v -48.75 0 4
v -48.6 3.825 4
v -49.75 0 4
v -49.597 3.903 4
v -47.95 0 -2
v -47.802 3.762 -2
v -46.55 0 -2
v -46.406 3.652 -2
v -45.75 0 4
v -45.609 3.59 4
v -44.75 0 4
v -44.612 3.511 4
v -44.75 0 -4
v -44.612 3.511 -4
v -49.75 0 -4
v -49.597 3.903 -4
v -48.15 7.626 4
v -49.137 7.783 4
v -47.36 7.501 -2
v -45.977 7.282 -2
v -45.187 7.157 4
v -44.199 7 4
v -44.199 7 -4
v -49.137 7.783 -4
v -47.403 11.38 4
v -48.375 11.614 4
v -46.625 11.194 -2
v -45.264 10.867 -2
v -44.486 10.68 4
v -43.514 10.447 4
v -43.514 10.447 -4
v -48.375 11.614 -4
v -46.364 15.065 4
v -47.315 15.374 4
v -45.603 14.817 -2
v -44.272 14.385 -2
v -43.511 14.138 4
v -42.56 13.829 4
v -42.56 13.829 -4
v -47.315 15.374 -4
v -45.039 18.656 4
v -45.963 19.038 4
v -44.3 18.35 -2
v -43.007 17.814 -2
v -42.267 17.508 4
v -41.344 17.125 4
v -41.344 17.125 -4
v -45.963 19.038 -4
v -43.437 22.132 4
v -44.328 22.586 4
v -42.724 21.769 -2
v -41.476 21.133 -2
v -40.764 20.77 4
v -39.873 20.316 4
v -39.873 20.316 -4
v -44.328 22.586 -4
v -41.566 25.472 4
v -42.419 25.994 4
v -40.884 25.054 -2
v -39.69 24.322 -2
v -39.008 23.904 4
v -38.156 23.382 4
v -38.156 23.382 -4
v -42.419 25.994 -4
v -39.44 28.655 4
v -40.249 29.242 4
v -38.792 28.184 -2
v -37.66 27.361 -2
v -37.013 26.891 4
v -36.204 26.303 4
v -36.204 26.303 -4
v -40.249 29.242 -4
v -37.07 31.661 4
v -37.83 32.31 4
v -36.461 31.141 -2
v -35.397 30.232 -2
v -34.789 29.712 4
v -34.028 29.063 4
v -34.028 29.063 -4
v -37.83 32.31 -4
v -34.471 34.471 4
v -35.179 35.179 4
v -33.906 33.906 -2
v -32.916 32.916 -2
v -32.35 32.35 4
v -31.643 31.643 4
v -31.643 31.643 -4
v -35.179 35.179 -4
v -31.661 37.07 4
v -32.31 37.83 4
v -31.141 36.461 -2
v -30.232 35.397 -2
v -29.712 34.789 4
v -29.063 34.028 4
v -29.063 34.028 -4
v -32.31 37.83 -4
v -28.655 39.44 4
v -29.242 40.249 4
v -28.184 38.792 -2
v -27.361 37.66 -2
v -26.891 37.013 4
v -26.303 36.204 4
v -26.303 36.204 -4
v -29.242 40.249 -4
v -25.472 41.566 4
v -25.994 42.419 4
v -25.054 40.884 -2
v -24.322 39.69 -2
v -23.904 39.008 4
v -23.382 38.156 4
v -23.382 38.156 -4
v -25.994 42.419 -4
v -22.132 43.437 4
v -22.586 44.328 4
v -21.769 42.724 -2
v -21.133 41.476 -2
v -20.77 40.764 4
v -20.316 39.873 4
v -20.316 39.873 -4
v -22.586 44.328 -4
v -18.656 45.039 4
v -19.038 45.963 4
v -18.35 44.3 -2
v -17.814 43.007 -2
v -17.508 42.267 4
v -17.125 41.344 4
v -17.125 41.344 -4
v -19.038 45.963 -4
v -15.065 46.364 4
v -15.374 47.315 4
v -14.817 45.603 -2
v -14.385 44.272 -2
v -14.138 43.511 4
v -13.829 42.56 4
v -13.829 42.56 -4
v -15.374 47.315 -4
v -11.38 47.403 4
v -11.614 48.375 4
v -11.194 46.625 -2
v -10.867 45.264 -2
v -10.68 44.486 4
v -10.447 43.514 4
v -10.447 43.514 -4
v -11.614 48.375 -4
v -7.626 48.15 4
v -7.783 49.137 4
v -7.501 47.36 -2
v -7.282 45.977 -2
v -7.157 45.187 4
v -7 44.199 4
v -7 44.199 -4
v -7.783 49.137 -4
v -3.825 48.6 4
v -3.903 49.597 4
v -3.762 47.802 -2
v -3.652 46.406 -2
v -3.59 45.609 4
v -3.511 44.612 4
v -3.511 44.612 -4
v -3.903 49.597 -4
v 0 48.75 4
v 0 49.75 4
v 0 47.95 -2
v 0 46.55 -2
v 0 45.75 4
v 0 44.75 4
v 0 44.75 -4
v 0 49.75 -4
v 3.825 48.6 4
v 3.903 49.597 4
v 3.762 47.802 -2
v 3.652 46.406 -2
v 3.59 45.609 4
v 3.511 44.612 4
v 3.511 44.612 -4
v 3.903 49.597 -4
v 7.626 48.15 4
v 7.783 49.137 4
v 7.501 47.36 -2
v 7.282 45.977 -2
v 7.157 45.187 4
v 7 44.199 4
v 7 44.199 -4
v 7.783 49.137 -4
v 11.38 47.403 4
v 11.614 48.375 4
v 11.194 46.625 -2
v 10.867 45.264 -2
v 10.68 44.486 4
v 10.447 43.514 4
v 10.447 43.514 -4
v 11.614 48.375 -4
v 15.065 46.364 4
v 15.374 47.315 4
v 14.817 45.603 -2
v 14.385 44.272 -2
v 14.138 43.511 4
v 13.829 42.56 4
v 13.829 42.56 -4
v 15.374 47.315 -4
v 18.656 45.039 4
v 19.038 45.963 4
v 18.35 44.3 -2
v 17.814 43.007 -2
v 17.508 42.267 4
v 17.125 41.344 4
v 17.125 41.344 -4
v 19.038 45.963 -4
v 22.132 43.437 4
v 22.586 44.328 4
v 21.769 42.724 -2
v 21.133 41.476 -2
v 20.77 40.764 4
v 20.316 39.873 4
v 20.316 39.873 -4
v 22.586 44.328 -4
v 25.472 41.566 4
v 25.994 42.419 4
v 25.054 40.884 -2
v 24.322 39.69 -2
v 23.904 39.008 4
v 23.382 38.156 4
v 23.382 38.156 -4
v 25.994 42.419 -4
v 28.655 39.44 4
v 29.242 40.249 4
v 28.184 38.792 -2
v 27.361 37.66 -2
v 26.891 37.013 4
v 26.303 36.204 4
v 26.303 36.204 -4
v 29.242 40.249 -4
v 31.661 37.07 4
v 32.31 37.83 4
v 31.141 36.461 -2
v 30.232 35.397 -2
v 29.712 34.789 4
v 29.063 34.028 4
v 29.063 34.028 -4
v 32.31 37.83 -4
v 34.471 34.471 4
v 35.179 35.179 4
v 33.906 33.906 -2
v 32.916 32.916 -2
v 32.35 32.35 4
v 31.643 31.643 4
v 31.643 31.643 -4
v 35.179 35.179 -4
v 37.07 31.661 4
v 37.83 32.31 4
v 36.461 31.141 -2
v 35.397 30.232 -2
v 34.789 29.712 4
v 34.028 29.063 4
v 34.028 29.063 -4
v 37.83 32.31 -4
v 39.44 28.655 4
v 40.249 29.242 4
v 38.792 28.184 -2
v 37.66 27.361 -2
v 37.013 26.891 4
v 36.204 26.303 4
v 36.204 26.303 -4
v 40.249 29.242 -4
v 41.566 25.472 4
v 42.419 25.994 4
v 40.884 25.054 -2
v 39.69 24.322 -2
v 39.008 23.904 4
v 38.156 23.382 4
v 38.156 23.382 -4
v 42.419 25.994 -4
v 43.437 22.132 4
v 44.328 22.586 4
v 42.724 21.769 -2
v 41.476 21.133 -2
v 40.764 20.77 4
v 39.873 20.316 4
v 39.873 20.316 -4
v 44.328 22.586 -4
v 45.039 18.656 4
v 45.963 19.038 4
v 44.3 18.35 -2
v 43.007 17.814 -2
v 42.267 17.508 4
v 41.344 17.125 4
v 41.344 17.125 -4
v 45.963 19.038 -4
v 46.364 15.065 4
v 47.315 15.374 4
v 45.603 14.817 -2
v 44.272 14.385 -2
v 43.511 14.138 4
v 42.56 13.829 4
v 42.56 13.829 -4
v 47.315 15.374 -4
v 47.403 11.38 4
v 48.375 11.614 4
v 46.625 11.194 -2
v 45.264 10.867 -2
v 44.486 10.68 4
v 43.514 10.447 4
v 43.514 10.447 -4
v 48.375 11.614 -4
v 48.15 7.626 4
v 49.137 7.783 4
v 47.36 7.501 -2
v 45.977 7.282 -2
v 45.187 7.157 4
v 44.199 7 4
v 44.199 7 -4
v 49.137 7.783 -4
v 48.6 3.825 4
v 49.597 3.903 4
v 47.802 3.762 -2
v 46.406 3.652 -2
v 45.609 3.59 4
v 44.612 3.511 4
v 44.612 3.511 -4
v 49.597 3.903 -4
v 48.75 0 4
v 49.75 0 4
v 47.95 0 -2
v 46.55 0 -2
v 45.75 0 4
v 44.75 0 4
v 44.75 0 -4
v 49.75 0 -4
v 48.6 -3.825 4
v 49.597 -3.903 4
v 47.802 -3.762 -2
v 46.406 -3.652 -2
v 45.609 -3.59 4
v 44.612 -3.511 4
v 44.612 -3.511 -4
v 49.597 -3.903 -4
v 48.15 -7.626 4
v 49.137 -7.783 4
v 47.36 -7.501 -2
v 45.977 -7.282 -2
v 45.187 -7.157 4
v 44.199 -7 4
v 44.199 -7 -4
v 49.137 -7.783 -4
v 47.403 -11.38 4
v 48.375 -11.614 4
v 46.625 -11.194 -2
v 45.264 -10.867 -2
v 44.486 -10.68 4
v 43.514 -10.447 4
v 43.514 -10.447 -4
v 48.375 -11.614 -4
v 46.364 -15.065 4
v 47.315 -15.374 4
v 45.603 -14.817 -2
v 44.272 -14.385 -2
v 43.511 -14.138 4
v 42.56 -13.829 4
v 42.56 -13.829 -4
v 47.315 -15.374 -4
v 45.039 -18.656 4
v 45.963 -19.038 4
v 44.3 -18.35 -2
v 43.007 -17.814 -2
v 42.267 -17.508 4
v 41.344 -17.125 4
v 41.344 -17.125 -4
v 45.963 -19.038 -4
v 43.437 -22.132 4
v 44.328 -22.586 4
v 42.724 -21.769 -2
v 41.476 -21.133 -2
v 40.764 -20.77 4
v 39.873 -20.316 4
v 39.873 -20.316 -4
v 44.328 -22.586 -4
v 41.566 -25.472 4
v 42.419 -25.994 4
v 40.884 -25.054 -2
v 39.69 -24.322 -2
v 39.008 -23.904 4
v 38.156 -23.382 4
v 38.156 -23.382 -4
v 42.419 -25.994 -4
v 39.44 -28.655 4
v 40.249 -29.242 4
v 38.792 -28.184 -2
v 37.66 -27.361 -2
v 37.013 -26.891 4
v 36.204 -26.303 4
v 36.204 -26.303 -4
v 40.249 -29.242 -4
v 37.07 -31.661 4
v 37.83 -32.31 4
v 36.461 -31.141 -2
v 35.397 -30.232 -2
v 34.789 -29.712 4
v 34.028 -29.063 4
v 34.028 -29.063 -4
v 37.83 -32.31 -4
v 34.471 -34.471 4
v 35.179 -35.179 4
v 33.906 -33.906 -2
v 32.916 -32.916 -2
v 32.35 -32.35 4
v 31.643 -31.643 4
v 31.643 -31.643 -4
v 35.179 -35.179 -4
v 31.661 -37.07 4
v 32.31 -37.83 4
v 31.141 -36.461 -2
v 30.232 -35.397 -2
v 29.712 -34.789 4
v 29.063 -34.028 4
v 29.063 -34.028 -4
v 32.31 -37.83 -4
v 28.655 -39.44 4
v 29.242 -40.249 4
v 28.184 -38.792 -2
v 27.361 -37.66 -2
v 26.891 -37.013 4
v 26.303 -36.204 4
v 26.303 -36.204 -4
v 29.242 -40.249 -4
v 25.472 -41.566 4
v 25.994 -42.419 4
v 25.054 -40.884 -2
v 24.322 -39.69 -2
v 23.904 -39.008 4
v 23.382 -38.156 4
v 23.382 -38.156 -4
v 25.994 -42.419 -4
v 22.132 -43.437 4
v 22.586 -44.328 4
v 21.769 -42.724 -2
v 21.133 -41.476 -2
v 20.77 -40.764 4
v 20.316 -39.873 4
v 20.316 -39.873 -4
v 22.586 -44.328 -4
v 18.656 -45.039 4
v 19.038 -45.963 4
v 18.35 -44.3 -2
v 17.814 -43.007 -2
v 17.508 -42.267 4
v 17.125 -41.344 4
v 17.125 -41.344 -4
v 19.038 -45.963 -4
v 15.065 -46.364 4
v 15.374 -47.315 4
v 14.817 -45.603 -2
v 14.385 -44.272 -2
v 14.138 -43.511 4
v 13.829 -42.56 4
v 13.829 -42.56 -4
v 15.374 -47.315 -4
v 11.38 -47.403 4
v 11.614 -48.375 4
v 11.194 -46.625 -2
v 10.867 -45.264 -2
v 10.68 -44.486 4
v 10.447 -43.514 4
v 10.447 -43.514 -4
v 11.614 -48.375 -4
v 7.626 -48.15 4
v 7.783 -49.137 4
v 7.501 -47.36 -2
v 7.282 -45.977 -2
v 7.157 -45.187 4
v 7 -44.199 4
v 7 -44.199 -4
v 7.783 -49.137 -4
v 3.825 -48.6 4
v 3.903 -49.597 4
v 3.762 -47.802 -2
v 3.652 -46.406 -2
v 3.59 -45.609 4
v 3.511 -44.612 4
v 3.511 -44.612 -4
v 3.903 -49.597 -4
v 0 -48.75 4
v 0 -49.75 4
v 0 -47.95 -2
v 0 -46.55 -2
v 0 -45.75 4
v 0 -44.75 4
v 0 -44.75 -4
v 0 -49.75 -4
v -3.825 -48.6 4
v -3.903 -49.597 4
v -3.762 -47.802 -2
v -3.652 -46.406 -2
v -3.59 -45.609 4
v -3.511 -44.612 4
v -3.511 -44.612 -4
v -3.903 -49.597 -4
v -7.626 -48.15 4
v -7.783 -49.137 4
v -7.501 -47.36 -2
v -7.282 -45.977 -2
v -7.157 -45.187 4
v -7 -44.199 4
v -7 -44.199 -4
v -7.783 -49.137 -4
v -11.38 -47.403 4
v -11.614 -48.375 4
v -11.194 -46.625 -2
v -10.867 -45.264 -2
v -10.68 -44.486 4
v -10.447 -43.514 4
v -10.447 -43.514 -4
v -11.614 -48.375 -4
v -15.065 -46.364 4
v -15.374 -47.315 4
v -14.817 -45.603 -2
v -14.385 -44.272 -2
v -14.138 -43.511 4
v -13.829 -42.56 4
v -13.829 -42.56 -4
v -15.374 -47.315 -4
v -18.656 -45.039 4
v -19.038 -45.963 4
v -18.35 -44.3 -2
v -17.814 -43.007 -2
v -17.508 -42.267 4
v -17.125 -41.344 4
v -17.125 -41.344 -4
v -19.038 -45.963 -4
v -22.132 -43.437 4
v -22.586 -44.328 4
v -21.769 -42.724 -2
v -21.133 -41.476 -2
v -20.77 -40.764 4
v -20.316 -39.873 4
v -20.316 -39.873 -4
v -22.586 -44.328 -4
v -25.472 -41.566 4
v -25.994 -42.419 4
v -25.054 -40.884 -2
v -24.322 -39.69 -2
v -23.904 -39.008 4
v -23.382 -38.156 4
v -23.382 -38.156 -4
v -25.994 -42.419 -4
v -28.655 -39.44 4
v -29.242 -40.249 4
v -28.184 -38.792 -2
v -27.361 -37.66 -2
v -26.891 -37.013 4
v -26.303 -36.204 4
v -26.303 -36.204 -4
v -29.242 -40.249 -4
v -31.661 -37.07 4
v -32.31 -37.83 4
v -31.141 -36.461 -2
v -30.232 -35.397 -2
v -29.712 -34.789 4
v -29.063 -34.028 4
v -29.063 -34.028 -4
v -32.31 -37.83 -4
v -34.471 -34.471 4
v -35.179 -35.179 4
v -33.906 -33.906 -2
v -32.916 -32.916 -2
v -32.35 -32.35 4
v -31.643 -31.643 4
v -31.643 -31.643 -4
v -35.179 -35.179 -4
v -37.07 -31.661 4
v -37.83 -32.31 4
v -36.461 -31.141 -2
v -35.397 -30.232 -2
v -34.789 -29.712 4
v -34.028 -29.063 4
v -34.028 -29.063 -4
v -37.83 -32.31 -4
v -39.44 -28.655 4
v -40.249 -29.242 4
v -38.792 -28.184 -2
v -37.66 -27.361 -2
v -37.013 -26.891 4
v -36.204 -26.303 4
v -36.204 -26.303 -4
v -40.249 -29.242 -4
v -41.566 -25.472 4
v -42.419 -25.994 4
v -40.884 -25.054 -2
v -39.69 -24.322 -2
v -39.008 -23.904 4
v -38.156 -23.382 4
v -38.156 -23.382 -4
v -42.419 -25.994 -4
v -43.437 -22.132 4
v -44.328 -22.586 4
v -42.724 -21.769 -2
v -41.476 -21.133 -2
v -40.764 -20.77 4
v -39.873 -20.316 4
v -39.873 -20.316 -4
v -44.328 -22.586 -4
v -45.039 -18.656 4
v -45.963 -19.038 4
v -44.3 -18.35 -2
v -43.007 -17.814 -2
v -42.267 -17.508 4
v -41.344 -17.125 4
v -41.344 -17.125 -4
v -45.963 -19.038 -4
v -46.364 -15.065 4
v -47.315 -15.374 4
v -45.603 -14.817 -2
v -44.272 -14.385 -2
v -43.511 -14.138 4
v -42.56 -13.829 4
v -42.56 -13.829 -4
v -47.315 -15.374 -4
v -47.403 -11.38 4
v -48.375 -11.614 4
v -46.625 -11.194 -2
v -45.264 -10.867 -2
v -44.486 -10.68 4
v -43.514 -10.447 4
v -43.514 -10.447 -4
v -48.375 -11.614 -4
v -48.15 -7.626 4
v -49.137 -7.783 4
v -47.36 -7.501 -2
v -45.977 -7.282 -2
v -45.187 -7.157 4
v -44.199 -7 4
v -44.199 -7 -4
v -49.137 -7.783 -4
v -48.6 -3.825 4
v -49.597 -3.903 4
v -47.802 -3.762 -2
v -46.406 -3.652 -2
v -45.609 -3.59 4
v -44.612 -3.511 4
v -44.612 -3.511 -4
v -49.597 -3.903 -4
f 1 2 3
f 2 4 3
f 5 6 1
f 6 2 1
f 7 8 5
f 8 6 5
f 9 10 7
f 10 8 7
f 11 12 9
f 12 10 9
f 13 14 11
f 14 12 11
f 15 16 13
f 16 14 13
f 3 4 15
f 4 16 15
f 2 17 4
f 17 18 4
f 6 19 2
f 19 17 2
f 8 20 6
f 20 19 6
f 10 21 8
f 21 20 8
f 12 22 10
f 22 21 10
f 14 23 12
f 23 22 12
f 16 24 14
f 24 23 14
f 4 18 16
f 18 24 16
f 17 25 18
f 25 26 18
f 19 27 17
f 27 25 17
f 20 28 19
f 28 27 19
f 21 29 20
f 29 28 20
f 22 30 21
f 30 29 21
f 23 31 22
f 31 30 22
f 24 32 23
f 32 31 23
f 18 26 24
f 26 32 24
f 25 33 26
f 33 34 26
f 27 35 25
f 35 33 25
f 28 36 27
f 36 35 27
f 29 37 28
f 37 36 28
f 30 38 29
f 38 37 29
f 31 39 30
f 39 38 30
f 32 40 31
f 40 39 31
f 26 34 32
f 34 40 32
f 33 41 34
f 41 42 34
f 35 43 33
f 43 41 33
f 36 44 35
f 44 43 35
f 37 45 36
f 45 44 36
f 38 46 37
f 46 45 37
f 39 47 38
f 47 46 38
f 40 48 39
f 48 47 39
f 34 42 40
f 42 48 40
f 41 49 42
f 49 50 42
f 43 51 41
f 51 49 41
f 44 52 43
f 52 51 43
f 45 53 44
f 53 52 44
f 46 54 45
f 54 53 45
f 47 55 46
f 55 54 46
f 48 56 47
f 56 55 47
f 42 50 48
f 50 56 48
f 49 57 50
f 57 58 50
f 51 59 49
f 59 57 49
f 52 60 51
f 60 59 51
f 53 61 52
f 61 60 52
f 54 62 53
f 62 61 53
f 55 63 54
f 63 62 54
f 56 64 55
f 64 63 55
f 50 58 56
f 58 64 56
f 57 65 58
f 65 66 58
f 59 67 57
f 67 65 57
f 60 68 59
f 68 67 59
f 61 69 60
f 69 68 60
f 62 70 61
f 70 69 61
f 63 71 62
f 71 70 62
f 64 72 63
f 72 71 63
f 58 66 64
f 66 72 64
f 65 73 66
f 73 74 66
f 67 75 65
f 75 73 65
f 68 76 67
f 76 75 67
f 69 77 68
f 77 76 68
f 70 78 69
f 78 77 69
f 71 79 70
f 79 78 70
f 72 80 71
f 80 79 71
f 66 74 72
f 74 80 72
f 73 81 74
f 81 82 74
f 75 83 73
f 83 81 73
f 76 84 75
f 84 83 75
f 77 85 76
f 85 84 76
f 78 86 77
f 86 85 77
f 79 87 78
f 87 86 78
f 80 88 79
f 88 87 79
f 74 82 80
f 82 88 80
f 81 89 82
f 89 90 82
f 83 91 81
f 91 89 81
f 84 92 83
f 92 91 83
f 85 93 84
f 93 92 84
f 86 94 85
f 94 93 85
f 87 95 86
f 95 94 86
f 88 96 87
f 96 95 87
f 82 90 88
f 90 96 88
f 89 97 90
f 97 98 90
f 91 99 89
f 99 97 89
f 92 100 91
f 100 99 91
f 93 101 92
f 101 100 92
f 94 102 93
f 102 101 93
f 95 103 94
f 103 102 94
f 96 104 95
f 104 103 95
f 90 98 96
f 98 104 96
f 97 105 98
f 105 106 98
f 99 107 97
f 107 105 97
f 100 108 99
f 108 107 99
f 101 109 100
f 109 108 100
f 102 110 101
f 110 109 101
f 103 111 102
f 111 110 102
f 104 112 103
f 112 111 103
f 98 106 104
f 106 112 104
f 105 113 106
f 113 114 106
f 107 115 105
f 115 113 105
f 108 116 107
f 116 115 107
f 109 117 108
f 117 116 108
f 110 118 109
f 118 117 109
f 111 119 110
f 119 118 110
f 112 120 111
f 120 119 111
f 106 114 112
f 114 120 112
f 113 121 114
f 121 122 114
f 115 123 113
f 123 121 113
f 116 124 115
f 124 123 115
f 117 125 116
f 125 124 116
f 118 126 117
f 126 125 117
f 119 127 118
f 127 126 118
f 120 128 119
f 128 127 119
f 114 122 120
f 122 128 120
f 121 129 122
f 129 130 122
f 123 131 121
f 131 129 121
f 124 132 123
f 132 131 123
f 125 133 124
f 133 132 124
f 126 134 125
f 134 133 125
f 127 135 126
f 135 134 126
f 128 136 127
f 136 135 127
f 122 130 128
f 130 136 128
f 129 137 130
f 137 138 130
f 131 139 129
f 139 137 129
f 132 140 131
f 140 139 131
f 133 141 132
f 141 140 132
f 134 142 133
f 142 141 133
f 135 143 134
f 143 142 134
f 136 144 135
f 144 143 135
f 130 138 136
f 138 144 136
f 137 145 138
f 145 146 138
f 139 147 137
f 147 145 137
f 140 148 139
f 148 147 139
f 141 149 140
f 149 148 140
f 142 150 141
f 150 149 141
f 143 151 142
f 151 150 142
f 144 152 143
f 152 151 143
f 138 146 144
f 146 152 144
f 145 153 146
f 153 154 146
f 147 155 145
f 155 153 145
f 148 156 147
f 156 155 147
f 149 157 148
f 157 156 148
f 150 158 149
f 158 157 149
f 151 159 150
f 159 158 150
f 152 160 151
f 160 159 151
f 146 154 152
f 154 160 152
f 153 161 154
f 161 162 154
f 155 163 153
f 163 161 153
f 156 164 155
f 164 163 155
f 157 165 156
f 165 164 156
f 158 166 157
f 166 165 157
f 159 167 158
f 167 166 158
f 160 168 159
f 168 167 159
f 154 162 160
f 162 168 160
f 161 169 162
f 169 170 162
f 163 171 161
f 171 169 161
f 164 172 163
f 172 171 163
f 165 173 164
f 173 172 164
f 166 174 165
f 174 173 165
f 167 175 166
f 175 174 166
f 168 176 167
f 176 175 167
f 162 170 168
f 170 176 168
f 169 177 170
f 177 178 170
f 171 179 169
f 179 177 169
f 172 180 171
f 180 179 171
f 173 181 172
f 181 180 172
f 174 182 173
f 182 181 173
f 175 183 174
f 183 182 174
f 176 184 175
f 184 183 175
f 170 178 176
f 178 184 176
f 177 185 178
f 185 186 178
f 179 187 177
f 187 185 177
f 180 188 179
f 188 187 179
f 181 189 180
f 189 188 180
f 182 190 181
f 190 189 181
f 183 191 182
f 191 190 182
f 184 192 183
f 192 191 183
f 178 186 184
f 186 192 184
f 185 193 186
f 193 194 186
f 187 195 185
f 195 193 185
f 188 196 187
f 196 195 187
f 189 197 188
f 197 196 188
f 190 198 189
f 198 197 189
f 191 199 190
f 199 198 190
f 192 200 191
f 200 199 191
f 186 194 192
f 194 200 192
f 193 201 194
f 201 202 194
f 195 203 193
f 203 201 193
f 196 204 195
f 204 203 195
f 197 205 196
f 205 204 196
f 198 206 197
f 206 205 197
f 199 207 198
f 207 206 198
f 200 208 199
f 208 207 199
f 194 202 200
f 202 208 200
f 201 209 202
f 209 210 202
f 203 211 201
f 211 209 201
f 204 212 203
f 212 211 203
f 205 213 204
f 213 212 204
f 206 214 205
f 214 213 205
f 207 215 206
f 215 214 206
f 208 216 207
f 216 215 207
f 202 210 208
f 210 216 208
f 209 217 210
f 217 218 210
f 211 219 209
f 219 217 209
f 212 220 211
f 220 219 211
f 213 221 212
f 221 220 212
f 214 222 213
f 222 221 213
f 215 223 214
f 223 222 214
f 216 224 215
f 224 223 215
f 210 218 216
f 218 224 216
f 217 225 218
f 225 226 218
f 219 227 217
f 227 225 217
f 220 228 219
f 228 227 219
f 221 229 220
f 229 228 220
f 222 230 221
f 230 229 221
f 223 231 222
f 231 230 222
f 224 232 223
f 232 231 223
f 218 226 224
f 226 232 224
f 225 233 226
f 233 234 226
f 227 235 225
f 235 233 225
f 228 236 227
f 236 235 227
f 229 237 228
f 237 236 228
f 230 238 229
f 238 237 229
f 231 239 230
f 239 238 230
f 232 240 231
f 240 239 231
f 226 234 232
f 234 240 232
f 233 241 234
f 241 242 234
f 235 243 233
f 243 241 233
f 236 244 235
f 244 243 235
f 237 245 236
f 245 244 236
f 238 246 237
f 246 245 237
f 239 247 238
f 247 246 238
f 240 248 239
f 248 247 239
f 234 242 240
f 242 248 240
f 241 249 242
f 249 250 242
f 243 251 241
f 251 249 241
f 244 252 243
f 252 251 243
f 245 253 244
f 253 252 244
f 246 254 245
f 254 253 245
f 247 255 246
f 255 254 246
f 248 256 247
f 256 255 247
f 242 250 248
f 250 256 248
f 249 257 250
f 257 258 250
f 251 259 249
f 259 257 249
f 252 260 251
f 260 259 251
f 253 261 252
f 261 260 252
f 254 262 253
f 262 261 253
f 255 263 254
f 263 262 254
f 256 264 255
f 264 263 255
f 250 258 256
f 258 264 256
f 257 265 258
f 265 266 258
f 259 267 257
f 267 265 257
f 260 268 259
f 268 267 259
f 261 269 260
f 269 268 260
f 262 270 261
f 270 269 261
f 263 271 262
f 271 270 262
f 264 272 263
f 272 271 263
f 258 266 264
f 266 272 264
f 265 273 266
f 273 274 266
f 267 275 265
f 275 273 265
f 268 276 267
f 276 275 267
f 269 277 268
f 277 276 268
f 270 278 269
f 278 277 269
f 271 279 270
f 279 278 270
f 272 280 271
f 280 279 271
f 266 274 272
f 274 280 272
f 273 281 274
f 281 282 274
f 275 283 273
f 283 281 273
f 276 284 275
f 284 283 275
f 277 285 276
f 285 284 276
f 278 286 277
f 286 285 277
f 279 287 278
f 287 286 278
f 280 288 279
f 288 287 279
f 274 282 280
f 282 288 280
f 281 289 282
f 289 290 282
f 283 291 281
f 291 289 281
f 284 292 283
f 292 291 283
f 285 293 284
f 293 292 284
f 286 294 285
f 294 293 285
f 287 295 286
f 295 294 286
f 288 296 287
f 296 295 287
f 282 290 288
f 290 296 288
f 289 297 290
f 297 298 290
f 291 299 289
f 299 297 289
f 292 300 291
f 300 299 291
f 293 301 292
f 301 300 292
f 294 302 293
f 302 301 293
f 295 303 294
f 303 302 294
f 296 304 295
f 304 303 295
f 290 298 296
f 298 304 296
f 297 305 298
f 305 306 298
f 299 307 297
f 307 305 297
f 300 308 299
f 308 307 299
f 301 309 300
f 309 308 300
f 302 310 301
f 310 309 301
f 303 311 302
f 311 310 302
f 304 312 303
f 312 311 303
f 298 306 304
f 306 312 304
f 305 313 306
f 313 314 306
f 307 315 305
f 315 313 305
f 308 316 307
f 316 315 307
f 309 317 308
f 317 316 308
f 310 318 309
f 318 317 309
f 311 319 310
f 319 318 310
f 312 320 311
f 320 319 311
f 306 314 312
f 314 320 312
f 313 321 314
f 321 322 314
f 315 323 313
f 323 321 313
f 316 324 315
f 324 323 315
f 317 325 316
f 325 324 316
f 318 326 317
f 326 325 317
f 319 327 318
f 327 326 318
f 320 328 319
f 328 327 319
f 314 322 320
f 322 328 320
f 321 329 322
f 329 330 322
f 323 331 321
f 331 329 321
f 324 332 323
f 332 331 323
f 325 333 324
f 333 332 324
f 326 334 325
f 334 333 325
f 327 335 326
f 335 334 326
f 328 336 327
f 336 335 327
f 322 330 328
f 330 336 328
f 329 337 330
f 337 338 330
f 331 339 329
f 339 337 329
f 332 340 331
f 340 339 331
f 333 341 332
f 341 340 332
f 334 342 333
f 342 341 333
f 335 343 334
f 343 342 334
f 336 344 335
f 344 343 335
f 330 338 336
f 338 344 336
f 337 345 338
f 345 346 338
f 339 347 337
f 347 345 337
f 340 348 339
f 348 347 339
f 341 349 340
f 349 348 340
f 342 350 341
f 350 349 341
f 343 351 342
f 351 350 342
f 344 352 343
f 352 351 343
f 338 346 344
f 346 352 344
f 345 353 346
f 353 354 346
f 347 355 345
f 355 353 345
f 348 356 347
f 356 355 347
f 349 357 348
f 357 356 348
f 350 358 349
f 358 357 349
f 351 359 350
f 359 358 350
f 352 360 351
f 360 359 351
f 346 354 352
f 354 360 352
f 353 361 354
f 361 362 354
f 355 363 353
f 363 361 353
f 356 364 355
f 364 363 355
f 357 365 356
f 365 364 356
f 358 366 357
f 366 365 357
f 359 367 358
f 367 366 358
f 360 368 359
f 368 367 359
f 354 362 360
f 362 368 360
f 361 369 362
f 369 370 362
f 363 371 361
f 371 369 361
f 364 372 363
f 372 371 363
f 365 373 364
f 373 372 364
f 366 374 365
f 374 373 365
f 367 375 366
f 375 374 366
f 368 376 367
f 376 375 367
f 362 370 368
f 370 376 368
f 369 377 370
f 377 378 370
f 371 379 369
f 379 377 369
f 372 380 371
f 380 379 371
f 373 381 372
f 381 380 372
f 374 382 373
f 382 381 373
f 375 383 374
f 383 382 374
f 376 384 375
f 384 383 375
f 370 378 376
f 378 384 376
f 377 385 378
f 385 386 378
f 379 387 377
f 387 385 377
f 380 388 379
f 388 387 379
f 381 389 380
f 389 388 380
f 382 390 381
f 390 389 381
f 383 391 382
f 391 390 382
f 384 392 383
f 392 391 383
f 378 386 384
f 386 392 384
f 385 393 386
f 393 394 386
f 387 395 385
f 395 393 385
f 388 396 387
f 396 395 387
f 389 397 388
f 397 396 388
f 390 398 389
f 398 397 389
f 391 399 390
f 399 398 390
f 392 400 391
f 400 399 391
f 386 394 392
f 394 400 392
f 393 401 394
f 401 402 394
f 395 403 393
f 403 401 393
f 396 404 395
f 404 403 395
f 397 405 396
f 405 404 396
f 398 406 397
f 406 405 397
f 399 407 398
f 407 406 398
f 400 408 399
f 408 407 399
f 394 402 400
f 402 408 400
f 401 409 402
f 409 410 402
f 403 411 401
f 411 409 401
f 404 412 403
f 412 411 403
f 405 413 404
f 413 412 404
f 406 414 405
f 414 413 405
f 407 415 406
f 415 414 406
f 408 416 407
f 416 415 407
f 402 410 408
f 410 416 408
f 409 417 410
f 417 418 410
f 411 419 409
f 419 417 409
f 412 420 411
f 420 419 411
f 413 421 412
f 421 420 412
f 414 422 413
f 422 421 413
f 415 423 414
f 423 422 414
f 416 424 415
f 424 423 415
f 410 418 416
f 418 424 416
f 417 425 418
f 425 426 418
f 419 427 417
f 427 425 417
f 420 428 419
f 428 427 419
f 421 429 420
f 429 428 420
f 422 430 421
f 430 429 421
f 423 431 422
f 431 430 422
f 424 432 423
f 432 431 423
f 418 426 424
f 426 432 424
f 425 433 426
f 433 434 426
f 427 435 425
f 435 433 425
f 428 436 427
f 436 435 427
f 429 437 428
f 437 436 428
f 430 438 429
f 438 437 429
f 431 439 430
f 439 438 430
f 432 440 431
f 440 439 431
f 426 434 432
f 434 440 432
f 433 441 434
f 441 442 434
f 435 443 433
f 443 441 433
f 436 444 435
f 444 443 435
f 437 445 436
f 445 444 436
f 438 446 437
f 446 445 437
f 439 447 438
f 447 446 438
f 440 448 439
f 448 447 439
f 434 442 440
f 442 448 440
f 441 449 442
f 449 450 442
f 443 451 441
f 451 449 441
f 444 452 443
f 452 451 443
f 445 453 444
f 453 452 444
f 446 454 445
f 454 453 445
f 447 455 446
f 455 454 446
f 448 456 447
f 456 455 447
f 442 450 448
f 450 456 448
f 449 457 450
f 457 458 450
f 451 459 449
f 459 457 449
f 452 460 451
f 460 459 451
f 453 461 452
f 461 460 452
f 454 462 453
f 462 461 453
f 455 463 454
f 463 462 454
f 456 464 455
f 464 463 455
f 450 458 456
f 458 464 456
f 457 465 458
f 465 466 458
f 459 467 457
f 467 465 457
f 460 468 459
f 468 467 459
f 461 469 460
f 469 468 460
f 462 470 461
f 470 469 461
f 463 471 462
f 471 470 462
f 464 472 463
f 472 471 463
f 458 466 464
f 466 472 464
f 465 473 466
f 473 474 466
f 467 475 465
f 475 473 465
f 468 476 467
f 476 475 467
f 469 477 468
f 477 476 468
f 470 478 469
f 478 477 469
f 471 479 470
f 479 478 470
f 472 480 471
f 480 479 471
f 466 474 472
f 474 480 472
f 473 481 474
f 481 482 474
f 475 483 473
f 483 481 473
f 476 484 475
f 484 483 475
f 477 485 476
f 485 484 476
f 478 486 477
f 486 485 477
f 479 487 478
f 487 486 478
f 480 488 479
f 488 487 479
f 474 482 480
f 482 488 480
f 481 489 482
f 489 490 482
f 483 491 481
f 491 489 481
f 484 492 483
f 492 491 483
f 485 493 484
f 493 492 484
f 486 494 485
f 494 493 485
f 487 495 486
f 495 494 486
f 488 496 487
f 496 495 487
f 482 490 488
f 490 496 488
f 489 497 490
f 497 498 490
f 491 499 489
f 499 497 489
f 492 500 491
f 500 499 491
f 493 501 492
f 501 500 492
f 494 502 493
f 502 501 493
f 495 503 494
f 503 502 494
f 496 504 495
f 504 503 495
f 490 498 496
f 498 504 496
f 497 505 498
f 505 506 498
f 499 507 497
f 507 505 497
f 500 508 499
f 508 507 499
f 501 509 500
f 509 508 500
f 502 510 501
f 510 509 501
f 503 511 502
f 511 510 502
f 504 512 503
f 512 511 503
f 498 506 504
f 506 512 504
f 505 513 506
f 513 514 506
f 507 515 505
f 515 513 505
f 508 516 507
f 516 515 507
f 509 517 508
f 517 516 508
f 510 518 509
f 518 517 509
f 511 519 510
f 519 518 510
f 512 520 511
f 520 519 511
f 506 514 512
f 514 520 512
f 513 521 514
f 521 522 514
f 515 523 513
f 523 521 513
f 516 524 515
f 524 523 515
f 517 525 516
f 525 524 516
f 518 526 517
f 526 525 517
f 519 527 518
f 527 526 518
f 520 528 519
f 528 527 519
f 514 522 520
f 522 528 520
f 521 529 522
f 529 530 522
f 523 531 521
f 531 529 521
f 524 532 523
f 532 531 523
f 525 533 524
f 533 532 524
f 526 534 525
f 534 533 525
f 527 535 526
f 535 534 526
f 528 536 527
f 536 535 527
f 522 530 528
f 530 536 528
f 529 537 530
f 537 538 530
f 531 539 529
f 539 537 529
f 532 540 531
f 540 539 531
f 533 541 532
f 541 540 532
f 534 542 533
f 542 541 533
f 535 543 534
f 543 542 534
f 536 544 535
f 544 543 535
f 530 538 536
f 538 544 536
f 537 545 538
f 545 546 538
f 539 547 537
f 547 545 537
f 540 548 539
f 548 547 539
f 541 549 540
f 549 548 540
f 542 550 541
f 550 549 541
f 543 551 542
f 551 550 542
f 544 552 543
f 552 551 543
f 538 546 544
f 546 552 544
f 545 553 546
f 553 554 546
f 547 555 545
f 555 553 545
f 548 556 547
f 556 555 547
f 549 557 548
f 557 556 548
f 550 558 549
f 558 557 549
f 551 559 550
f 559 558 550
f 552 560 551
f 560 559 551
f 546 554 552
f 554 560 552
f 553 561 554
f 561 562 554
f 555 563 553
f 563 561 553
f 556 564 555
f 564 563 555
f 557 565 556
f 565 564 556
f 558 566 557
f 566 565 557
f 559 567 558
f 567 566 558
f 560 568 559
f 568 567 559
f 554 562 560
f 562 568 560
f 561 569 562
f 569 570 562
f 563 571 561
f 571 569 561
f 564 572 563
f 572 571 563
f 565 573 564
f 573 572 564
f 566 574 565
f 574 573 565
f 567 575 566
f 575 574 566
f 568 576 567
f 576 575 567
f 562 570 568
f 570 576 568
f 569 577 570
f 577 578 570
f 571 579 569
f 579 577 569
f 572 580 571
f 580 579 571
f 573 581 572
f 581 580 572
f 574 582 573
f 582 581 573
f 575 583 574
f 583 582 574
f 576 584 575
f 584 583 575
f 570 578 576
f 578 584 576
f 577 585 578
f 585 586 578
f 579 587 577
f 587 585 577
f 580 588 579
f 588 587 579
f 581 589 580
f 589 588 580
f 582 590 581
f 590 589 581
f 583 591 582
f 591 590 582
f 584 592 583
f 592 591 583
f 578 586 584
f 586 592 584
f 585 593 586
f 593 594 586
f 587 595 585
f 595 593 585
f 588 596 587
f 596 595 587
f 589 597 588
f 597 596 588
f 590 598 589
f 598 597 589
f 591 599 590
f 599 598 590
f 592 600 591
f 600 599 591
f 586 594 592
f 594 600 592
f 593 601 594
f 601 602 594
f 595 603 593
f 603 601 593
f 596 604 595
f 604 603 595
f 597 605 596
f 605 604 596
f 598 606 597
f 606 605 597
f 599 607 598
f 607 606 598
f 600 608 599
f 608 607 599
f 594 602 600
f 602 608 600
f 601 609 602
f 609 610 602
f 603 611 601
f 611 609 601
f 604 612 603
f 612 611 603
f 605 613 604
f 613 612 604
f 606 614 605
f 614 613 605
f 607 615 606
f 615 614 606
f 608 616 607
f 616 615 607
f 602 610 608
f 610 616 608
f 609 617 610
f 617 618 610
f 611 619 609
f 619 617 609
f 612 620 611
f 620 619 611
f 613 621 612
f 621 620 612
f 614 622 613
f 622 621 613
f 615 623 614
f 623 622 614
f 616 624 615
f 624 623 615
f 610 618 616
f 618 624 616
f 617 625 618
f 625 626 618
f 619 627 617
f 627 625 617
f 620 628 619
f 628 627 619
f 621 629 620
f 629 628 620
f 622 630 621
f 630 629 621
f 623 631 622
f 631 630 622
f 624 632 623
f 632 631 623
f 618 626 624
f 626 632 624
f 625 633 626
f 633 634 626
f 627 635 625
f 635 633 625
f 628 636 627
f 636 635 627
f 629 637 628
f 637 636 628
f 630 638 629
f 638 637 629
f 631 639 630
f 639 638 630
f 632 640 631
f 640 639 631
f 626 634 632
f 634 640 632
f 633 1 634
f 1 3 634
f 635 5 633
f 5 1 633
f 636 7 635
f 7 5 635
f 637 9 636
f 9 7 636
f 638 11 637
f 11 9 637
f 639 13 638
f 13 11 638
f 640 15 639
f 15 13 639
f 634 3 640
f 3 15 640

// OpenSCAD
// file: _params.scad
// =========================================================================
// 공유 파라미터 (모든 개별 부품 파일에서 include)
// 메인 어셈블리: cup_z_x_catrage_frame_water_mic_anti_3030.scad 에서 추출
// 프레임: 600 × 420 × 700mm (3030 프로파일, Y=0 대칭)
// =========================================================================

$fn = 60;  // 부품 출력용 고해상도
GLOBAL_TOLERANCE = 0.2;

// --- [1] 하부 기성품 및 원통 파라미터 ---
X_RAIL_LEN = 290.0;
X_BLOCK_W = 30.0; X_BLOCK_L = 32.0;   // 신규 X슬라이더 블록 (폭 30mm × 길이 32mm)
X_PITCH_X = 20.0; X_PITCH_Y = 20.0;   // 체결 홀 피치 (20 × 20mm, M3 나사탭 4개)
X_RAIL_W = 30.0;  X_RAIL_H = 20.0;   // 레일 폭 30mm (레일 바닥~블록 윗면 높이 29mm 반영)
X_TOTAL_H = 29.0;                    // 레일 바닥에서 슬라이더 블록 윗면까지의 높이

MOTOR_W = 42.0;      MOTOR_PITCH = 31.0; MOTOR_HOLE_D = 3.5;    
MOTOR_BOSS_D = 22.0; MOTOR_BOSS_H = 2.0; SCREW_D = 8.0;         
MOT_BODY_L = 41.0;   SHAFT_L = 24.0;     // 실측 NEMA17 몸통 41mm / 축 돌출 24mm

CUP_ID = 99.5;  CUP_WALL = 5.0; CUP_OD = 110.0;     // 아크릴 원통 OD110/ID100
CUP_H = 180.0;   CAGE_H = 60.0;  FLOOR_H = 10.0; PISTON_H = 20.0;     

LIP_D = 30.0;    LIP_H = 5.0;    LEAK_DRAIN_D = 4.0;    
GUIDE_PIPE_D = 8.0; BUSHING_OD = 12.0; BUSHING_H = 8.0;       
DRAIN_RADIUS = 35.0; DRAIN_D = 8.0;        

Y_OFFSET = 85.0; BRKT_H = 12.0; BRKT_D = 122.0; BRKT_ID = 62.0; Z_MOUNT_PCD = 86.0;   

// --- [2] 아크릴 파이프 및 상부 카트리지 ---
ACRYL_ID = 100.0; ACRYL_T = 5.0; ACRYL_OD = ACRYL_ID + (ACRYL_T * 2);  // OD110 (아크릴집 106 재고없음 → 컵과 동일 규격)

REVOLVER_PCD = 240.0;     // 인접 카트리지 웹 9.8mm 확보 (OD110 대응, 230→240)
CARTRIDGE_OD = REVOLVER_PCD + ACRYL_OD + 8; 
TOP_PLATE_H = 15.0;       // 아크릴 15T 통판 (보스홀 단 깊이 10mm)

HUB_D = 60.0;            
SHAFT_D = 12.0;          
HUB_WALL = 4.0;          
HUB_H = 15.0;             // 아크릴 5T × 3장 적층 — 파이프 130mm 대응
POCKET_DEPTH = 5.0;
MID_HUB_Z = 63.5;          // 중단 허브 하면 Z (벨트 중심 Z=71.0mm 정렬, 풀리 상단 Z=75.0mm = 축상단-1mm)
UPPER_HUB_Z = 135.0;       // 상단 허브 하면 Z (전체 135+15=150 유지)
BOSS_OD = 35.0;
BOSS_H = 11.0;             // 보스11 + 와셔1 = 12, 리세스10 → 허브 2mm 공중

// --- [3] GT2 벨트 구동 시스템 ---
GT2_PITCH     = 2.0;
GT2_BELT_W    = 6.0;
BIG_PULLEY_TEETH = 566;
BIG_PULLEY_PD = BIG_PULLEY_TEETH * GT2_PITCH / PI;
BIG_PULLEY_OD = BIG_PULLEY_PD + 1.0;
SMALL_PULLEY_TEETH = 20;
SMALL_PULLEY_PD = SMALL_PULLEY_TEETH * GT2_PITCH / PI;
SMALL_PULLEY_OD = SMALL_PULLEY_PD + 1.0;

BELT_MOTOR_X = -300;
BELT_MOTOR_Y = -155.5;
BRKT_MOTOR_H = 25.0;
BRKT_MOTOR_W = 45.0;        // 브래킷 폭 45mm (프로파일 간섭 회피 복원)
SLOT_LEN = 10.0;
FLAG_W = 15.0;  FLAG_H = 8.0;  FLAG_T = 1.5;

X_POS_MEASURE = 170.0;   // 측정 브래킷 X좌표 (X_M~X_R 정중앙, X대칭)

// --- [4] 3030 프레임 경계 (600×430×700mm) ---
PF = 30;             // 3030 알루미늄 프로파일
WASHER_T = 1.0;     

X_L = -320;
X_M = 60;
X_R = 250;
Y_F = -210;          // 전방 (대칭: -210+30=-180, Y=0 중심)
Y_B = 180;           // 후방 (대칭: 180+30=210, Y=0 중심) — 메인파일과 동기화

Z_BOT = -480;
Z_RAIL = -322;
Z_MID = -TOP_PLATE_H - PF;
Z_TOP = 220;

SUPPORT_PILLAR_H = Z_TOP - PF;

SHAFT_SQ = 20;       // 2020 사각 회전축

// 사각 축 홀 크기
SQ = SHAFT_SQ + GLOBAL_TOLERANCE;  // 20.2mm

// --- 리볼버/컵 축 정렬 (보스홀=판 중심에 리볼버 정렬) ---
REVOLVER_CX = (X_L + X_M + PF)/2;        // 판 중심 = 보스홀 = 리볼버 회전축 (-115)
DROP_X      = REVOLVER_CX + REVOLVER_PCD/2;  // 링 드롭 / 컵 적재 축 (+5)

FLANGE_Z = 52.0;       // 모터 전면 안착 높이 (Z=52mm -> 축 상단 Z=76mm, 풀리 결합)

// --- [5] 모터 체결홀 (이미 제작 완료된 15T 상판 원본 도면 수치 100% 유지) ---
MOTOR_BOLT_PITCH     = 25.0;      // Y피치 (Y = ±12.5mm)
MOTOR_BOLT_X_NOMINAL = X_L + 55;  // 1열: 상판 좌단 55 (모터축 기준 +35mm = X=-265mm)
MOTOR_BOLT_X_SHIFT   = X_L + 40;  // 2열: 상판 좌단 40 (모터축 기준 +20mm = X=-280mm)

// 모터 마운트 볼트 카운터보어 (단볼트용 — 브래킷 두께 25 중 깊게 파냄)
MOTOR_CB_D     = 6.5;            // M3 캡볼트 머리 클리어런스
MOTOR_CB_DEPTH = 19;             // 카운터보어 깊이 (잔여 통과 6mm → M3×10 단볼트)
// main file
// =========================================================================
// [구매] 피스톤 실링용 U패킹 × 1
// 규격: ø100 실린더 보어용 (OD100 × ID90 × W8.0mm)
// 재질: 폴리우레탄 (Polyurethane, 청색) 또는 니트릴 고무 (NBR)
// 특징: U자 형태의 립(Lip)이 압력(수압) 방향인 상방을 향하도록 장착
// =========================================================================
include <_params.scad>

UPAK_W = 8.0;      // U패킹 폭
UPAK_DEPTH = 5.0;   // 패킹 두께 (단면 폭)

color([0.1, 0.4, 0.8, 1.0]) {
    // U패킹 립 단면 형상을 회전 압출하여 정밀 렌더링
    rotate_extrude($fn = 80) {
        polygon(points = [
            [(CUP_ID - UPAK_DEPTH * 2) / 2, -UPAK_W / 2],       // [45, -4]
            [CUP_ID / 2, -UPAK_W / 2],                           // [50, -4]
            [CUP_ID / 2, UPAK_W / 2],                            // [50, 4]
            [CUP_ID / 2 - 1.0, UPAK_W / 2],                      // [49, 4]
            [CUP_ID / 2 - 1.8, -UPAK_W / 2 + 2.0],               // [48.2, -2]
            [(CUP_ID - UPAK_DEPTH * 2) / 2 + 1.8, -UPAK_W / 2 + 2.0], // [46.8, -2]
            [(CUP_ID - UPAK_DEPTH * 2) / 2 + 1.0, UPAK_W / 2],   // [46, 4]
            [(CUP_ID - UPAK_DEPTH * 2) / 2, UPAK_W / 2]          // [45, 4]
        ]);
    }
}
